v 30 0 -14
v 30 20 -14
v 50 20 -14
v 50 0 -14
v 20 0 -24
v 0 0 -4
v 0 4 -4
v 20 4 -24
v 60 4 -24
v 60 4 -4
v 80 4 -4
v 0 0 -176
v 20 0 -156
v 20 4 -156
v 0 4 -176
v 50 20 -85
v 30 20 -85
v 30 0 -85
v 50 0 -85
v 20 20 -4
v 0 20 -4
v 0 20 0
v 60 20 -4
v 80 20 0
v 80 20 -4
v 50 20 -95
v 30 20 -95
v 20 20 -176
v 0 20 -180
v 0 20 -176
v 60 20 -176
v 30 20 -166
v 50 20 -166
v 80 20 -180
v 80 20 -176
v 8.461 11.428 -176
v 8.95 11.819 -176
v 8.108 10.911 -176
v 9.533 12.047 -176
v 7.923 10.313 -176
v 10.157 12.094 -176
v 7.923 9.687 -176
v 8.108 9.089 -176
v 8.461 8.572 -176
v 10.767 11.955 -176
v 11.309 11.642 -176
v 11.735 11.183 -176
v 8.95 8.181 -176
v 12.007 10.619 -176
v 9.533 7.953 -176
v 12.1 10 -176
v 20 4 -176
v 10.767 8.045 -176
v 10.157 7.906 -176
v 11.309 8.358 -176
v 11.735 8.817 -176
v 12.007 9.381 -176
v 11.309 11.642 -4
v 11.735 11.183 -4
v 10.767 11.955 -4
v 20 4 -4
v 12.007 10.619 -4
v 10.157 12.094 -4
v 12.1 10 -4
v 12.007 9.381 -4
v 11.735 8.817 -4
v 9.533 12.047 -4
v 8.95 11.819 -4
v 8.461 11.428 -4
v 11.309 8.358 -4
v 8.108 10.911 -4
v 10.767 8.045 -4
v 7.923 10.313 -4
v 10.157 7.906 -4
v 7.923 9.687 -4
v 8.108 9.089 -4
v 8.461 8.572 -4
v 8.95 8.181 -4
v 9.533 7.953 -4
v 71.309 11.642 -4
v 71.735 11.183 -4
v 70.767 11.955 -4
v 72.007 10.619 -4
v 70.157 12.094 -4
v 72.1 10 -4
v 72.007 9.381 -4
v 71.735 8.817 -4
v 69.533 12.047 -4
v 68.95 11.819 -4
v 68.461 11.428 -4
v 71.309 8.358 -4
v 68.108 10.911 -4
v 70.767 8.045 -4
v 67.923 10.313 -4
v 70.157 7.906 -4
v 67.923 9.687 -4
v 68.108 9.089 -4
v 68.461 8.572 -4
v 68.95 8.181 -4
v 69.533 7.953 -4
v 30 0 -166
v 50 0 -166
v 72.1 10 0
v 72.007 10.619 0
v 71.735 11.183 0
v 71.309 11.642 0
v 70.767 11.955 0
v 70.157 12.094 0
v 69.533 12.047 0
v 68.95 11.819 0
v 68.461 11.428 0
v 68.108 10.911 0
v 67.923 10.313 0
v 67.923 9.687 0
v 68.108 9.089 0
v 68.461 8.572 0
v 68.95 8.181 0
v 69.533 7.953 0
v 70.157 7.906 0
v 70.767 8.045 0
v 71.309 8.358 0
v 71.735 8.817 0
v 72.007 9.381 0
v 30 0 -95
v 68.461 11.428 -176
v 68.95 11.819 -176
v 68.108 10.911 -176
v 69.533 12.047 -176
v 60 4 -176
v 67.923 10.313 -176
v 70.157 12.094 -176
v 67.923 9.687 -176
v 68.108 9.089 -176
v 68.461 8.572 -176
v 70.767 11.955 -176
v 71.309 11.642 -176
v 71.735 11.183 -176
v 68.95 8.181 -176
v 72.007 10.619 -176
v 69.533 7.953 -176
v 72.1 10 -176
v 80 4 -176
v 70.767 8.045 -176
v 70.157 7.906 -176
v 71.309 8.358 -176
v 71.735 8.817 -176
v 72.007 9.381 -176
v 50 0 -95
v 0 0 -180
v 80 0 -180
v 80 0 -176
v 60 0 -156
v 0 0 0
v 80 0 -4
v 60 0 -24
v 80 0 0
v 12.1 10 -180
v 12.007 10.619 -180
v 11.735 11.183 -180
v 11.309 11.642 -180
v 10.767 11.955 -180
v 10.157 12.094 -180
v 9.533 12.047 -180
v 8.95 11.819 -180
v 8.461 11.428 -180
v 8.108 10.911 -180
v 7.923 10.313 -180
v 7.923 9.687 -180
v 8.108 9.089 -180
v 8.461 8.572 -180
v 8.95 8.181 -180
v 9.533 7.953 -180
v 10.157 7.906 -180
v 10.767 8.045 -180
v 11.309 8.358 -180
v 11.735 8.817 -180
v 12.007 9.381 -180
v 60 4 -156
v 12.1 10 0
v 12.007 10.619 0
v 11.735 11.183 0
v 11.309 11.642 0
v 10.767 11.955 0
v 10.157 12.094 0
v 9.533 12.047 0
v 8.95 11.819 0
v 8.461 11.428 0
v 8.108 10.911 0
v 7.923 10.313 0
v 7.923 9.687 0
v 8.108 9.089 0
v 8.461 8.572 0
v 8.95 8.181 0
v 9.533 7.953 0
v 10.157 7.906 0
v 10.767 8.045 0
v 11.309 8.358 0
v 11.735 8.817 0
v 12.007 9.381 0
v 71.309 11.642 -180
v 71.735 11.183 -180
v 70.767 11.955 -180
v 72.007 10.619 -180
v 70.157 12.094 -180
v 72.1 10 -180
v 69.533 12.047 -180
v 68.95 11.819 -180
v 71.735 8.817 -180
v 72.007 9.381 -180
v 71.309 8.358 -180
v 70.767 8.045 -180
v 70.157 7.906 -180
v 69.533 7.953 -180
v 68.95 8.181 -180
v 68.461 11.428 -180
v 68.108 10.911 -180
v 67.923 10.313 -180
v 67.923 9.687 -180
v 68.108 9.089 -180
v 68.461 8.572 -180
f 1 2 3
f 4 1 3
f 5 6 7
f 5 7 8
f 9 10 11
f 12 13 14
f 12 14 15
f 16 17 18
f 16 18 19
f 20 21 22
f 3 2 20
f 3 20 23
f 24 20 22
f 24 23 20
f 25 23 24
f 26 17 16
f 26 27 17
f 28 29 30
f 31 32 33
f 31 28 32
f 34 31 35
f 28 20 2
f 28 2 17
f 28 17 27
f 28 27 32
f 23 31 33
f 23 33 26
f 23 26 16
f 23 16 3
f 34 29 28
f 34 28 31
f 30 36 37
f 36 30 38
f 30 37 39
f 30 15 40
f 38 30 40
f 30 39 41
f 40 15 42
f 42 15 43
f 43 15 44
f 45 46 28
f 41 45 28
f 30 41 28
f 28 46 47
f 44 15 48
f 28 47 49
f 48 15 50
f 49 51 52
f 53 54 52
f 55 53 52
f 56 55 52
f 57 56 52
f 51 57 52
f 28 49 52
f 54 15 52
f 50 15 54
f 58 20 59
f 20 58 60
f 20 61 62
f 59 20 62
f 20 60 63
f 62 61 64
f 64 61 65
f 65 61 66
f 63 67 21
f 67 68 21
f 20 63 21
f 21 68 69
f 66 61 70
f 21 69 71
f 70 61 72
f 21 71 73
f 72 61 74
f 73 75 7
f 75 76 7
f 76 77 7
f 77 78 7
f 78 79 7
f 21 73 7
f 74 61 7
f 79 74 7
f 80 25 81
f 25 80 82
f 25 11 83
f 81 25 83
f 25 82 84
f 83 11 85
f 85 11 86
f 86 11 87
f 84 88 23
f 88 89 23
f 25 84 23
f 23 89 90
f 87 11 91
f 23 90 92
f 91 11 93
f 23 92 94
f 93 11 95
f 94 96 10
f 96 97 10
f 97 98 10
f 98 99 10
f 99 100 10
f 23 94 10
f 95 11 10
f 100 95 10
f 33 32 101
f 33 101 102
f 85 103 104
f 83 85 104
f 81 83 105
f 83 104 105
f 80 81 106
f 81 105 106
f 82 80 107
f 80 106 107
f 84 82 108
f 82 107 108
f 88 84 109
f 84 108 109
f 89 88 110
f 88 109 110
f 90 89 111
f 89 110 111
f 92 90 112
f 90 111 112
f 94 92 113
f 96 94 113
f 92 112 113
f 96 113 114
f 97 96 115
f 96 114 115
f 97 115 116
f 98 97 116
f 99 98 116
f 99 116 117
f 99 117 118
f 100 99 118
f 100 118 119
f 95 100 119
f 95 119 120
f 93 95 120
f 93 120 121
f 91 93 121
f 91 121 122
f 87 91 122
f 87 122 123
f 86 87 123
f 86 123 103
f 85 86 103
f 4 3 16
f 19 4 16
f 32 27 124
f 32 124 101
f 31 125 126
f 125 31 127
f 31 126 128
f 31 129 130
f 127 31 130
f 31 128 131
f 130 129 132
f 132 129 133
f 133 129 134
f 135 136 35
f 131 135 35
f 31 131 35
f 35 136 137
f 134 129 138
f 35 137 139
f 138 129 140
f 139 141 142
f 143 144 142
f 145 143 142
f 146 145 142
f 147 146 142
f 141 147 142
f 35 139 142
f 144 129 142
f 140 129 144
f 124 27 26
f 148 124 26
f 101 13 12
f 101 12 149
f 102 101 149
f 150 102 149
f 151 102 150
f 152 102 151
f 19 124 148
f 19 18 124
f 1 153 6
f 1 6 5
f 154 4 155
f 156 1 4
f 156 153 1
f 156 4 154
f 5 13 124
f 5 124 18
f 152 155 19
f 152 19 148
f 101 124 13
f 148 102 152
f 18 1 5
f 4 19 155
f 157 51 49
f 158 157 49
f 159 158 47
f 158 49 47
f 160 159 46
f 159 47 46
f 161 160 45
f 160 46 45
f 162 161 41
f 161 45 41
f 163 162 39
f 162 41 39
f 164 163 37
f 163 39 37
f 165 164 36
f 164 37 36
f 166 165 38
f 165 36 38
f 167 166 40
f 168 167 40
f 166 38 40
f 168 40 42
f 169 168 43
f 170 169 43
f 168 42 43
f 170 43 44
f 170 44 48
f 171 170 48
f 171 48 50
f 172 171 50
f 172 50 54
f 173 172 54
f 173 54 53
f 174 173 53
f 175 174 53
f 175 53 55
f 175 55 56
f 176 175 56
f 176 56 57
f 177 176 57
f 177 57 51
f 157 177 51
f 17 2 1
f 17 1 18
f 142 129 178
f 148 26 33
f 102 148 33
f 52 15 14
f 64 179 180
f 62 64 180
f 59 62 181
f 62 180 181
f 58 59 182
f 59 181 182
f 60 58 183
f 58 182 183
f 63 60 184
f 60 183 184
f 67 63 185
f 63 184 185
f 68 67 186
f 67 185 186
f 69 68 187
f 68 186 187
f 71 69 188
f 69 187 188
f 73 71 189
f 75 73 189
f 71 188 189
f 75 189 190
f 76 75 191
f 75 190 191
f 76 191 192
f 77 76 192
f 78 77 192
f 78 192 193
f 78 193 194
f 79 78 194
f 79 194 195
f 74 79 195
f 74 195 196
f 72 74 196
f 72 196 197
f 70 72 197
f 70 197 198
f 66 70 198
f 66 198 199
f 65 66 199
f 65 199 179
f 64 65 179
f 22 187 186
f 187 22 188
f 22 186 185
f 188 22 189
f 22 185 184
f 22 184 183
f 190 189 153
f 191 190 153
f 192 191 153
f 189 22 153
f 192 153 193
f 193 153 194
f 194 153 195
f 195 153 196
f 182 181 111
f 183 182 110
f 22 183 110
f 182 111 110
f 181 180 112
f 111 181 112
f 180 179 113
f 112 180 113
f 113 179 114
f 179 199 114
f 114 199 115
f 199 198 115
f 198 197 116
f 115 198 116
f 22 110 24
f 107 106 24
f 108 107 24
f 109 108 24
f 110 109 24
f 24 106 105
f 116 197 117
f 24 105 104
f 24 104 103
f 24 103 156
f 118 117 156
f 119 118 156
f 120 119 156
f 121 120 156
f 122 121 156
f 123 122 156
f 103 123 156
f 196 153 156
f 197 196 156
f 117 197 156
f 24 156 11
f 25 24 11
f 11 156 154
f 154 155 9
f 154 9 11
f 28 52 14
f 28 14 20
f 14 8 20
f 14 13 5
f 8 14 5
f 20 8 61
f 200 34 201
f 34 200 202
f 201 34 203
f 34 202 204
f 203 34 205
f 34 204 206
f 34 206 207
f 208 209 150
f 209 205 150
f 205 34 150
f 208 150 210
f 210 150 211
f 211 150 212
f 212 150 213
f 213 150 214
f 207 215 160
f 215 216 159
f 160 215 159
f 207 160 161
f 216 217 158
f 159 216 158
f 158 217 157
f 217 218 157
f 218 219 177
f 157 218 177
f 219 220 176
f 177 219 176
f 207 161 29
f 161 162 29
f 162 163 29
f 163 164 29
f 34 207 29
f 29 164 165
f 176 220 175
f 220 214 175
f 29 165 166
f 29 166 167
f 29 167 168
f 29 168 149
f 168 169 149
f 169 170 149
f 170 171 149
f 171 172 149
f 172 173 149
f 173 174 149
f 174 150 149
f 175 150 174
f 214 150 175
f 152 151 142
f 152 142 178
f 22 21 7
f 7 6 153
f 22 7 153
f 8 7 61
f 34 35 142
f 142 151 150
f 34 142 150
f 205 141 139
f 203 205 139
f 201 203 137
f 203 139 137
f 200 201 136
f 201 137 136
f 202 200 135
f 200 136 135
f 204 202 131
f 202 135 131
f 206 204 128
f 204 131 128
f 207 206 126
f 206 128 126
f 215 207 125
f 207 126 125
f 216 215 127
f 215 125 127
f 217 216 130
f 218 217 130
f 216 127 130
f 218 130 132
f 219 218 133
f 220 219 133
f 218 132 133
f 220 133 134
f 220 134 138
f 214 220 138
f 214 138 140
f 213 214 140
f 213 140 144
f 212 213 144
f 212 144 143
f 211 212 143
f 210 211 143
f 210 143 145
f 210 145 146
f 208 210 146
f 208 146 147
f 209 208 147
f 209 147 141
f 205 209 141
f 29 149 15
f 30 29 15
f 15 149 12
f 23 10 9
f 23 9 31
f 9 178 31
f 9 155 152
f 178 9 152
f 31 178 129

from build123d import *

# Parameters (mm, degrees)
BOSS_EXTRUDE1_DEPTH = 20
BOSS_EXTRUDE2_DEPTH = 4
SKETCH3_W           = 20
SKETCH3_H           = 71
CUT_EXTRUDE1_DEPTH  = 55
SKETCH6_R           = 2.1
CUT_EXTRUDE2_DEPTH  = 207


with BuildPart() as part:
    # Sketch1 → Boss-Extrude1 (new body)
    with BuildSketch(Plane(origin=(0, 0, 0), x_dir=(1, 0, 0), z_dir=(0, 1, 0))):
        Polygon((20, 176), (20, 4), (0, 4), (0, 0), (80, 0), (80, 4), (60, 4), (60, 176), (80, 176), (80, 180), (0, 180), (0, 176), align=None)
    extrude(amount=BOSS_EXTRUDE1_DEPTH)

    # Sketch2 → Boss-Extrude2 (add)
    with BuildSketch(Plane.XZ):
        Polygon((60, -4), (60, -24), (80, -4), align=None)
        Polygon((0, -4), (20, -24), (20, -4), align=None)
        Polygon((0, -176), (20, -176), (20, -156), align=None)
        Polygon((60, -176), (80, -176), (60, -156), align=None)
    extrude(amount=-BOSS_EXTRUDE2_DEPTH)

    # Sketch3 → Cut-Extrude1 (cut)
    with BuildSketch(Plane(origin=(0, 20, 0), x_dir=(1, 0, 0), z_dir=(0, 1, 0))):
        with Locations((40, 49.5)):
            Rectangle(SKETCH3_W, SKETCH3_H)
        with Locations((40, 130.5)):
            Rectangle(SKETCH3_W, SKETCH3_H)
    extrude(amount=-CUT_EXTRUDE1_DEPTH, mode=Mode.SUBTRACT)

    # Sketch6 → Cut-Extrude2 (cut)
    with BuildSketch(Plane.XY):
        with Locations((10, 10)):
            Circle(SKETCH6_R)
        with Locations((70, 10)):
            Circle(SKETCH6_R)
    extrude(amount=-CUT_EXTRUDE2_DEPTH, mode=Mode.SUBTRACT)


solid = part.part
